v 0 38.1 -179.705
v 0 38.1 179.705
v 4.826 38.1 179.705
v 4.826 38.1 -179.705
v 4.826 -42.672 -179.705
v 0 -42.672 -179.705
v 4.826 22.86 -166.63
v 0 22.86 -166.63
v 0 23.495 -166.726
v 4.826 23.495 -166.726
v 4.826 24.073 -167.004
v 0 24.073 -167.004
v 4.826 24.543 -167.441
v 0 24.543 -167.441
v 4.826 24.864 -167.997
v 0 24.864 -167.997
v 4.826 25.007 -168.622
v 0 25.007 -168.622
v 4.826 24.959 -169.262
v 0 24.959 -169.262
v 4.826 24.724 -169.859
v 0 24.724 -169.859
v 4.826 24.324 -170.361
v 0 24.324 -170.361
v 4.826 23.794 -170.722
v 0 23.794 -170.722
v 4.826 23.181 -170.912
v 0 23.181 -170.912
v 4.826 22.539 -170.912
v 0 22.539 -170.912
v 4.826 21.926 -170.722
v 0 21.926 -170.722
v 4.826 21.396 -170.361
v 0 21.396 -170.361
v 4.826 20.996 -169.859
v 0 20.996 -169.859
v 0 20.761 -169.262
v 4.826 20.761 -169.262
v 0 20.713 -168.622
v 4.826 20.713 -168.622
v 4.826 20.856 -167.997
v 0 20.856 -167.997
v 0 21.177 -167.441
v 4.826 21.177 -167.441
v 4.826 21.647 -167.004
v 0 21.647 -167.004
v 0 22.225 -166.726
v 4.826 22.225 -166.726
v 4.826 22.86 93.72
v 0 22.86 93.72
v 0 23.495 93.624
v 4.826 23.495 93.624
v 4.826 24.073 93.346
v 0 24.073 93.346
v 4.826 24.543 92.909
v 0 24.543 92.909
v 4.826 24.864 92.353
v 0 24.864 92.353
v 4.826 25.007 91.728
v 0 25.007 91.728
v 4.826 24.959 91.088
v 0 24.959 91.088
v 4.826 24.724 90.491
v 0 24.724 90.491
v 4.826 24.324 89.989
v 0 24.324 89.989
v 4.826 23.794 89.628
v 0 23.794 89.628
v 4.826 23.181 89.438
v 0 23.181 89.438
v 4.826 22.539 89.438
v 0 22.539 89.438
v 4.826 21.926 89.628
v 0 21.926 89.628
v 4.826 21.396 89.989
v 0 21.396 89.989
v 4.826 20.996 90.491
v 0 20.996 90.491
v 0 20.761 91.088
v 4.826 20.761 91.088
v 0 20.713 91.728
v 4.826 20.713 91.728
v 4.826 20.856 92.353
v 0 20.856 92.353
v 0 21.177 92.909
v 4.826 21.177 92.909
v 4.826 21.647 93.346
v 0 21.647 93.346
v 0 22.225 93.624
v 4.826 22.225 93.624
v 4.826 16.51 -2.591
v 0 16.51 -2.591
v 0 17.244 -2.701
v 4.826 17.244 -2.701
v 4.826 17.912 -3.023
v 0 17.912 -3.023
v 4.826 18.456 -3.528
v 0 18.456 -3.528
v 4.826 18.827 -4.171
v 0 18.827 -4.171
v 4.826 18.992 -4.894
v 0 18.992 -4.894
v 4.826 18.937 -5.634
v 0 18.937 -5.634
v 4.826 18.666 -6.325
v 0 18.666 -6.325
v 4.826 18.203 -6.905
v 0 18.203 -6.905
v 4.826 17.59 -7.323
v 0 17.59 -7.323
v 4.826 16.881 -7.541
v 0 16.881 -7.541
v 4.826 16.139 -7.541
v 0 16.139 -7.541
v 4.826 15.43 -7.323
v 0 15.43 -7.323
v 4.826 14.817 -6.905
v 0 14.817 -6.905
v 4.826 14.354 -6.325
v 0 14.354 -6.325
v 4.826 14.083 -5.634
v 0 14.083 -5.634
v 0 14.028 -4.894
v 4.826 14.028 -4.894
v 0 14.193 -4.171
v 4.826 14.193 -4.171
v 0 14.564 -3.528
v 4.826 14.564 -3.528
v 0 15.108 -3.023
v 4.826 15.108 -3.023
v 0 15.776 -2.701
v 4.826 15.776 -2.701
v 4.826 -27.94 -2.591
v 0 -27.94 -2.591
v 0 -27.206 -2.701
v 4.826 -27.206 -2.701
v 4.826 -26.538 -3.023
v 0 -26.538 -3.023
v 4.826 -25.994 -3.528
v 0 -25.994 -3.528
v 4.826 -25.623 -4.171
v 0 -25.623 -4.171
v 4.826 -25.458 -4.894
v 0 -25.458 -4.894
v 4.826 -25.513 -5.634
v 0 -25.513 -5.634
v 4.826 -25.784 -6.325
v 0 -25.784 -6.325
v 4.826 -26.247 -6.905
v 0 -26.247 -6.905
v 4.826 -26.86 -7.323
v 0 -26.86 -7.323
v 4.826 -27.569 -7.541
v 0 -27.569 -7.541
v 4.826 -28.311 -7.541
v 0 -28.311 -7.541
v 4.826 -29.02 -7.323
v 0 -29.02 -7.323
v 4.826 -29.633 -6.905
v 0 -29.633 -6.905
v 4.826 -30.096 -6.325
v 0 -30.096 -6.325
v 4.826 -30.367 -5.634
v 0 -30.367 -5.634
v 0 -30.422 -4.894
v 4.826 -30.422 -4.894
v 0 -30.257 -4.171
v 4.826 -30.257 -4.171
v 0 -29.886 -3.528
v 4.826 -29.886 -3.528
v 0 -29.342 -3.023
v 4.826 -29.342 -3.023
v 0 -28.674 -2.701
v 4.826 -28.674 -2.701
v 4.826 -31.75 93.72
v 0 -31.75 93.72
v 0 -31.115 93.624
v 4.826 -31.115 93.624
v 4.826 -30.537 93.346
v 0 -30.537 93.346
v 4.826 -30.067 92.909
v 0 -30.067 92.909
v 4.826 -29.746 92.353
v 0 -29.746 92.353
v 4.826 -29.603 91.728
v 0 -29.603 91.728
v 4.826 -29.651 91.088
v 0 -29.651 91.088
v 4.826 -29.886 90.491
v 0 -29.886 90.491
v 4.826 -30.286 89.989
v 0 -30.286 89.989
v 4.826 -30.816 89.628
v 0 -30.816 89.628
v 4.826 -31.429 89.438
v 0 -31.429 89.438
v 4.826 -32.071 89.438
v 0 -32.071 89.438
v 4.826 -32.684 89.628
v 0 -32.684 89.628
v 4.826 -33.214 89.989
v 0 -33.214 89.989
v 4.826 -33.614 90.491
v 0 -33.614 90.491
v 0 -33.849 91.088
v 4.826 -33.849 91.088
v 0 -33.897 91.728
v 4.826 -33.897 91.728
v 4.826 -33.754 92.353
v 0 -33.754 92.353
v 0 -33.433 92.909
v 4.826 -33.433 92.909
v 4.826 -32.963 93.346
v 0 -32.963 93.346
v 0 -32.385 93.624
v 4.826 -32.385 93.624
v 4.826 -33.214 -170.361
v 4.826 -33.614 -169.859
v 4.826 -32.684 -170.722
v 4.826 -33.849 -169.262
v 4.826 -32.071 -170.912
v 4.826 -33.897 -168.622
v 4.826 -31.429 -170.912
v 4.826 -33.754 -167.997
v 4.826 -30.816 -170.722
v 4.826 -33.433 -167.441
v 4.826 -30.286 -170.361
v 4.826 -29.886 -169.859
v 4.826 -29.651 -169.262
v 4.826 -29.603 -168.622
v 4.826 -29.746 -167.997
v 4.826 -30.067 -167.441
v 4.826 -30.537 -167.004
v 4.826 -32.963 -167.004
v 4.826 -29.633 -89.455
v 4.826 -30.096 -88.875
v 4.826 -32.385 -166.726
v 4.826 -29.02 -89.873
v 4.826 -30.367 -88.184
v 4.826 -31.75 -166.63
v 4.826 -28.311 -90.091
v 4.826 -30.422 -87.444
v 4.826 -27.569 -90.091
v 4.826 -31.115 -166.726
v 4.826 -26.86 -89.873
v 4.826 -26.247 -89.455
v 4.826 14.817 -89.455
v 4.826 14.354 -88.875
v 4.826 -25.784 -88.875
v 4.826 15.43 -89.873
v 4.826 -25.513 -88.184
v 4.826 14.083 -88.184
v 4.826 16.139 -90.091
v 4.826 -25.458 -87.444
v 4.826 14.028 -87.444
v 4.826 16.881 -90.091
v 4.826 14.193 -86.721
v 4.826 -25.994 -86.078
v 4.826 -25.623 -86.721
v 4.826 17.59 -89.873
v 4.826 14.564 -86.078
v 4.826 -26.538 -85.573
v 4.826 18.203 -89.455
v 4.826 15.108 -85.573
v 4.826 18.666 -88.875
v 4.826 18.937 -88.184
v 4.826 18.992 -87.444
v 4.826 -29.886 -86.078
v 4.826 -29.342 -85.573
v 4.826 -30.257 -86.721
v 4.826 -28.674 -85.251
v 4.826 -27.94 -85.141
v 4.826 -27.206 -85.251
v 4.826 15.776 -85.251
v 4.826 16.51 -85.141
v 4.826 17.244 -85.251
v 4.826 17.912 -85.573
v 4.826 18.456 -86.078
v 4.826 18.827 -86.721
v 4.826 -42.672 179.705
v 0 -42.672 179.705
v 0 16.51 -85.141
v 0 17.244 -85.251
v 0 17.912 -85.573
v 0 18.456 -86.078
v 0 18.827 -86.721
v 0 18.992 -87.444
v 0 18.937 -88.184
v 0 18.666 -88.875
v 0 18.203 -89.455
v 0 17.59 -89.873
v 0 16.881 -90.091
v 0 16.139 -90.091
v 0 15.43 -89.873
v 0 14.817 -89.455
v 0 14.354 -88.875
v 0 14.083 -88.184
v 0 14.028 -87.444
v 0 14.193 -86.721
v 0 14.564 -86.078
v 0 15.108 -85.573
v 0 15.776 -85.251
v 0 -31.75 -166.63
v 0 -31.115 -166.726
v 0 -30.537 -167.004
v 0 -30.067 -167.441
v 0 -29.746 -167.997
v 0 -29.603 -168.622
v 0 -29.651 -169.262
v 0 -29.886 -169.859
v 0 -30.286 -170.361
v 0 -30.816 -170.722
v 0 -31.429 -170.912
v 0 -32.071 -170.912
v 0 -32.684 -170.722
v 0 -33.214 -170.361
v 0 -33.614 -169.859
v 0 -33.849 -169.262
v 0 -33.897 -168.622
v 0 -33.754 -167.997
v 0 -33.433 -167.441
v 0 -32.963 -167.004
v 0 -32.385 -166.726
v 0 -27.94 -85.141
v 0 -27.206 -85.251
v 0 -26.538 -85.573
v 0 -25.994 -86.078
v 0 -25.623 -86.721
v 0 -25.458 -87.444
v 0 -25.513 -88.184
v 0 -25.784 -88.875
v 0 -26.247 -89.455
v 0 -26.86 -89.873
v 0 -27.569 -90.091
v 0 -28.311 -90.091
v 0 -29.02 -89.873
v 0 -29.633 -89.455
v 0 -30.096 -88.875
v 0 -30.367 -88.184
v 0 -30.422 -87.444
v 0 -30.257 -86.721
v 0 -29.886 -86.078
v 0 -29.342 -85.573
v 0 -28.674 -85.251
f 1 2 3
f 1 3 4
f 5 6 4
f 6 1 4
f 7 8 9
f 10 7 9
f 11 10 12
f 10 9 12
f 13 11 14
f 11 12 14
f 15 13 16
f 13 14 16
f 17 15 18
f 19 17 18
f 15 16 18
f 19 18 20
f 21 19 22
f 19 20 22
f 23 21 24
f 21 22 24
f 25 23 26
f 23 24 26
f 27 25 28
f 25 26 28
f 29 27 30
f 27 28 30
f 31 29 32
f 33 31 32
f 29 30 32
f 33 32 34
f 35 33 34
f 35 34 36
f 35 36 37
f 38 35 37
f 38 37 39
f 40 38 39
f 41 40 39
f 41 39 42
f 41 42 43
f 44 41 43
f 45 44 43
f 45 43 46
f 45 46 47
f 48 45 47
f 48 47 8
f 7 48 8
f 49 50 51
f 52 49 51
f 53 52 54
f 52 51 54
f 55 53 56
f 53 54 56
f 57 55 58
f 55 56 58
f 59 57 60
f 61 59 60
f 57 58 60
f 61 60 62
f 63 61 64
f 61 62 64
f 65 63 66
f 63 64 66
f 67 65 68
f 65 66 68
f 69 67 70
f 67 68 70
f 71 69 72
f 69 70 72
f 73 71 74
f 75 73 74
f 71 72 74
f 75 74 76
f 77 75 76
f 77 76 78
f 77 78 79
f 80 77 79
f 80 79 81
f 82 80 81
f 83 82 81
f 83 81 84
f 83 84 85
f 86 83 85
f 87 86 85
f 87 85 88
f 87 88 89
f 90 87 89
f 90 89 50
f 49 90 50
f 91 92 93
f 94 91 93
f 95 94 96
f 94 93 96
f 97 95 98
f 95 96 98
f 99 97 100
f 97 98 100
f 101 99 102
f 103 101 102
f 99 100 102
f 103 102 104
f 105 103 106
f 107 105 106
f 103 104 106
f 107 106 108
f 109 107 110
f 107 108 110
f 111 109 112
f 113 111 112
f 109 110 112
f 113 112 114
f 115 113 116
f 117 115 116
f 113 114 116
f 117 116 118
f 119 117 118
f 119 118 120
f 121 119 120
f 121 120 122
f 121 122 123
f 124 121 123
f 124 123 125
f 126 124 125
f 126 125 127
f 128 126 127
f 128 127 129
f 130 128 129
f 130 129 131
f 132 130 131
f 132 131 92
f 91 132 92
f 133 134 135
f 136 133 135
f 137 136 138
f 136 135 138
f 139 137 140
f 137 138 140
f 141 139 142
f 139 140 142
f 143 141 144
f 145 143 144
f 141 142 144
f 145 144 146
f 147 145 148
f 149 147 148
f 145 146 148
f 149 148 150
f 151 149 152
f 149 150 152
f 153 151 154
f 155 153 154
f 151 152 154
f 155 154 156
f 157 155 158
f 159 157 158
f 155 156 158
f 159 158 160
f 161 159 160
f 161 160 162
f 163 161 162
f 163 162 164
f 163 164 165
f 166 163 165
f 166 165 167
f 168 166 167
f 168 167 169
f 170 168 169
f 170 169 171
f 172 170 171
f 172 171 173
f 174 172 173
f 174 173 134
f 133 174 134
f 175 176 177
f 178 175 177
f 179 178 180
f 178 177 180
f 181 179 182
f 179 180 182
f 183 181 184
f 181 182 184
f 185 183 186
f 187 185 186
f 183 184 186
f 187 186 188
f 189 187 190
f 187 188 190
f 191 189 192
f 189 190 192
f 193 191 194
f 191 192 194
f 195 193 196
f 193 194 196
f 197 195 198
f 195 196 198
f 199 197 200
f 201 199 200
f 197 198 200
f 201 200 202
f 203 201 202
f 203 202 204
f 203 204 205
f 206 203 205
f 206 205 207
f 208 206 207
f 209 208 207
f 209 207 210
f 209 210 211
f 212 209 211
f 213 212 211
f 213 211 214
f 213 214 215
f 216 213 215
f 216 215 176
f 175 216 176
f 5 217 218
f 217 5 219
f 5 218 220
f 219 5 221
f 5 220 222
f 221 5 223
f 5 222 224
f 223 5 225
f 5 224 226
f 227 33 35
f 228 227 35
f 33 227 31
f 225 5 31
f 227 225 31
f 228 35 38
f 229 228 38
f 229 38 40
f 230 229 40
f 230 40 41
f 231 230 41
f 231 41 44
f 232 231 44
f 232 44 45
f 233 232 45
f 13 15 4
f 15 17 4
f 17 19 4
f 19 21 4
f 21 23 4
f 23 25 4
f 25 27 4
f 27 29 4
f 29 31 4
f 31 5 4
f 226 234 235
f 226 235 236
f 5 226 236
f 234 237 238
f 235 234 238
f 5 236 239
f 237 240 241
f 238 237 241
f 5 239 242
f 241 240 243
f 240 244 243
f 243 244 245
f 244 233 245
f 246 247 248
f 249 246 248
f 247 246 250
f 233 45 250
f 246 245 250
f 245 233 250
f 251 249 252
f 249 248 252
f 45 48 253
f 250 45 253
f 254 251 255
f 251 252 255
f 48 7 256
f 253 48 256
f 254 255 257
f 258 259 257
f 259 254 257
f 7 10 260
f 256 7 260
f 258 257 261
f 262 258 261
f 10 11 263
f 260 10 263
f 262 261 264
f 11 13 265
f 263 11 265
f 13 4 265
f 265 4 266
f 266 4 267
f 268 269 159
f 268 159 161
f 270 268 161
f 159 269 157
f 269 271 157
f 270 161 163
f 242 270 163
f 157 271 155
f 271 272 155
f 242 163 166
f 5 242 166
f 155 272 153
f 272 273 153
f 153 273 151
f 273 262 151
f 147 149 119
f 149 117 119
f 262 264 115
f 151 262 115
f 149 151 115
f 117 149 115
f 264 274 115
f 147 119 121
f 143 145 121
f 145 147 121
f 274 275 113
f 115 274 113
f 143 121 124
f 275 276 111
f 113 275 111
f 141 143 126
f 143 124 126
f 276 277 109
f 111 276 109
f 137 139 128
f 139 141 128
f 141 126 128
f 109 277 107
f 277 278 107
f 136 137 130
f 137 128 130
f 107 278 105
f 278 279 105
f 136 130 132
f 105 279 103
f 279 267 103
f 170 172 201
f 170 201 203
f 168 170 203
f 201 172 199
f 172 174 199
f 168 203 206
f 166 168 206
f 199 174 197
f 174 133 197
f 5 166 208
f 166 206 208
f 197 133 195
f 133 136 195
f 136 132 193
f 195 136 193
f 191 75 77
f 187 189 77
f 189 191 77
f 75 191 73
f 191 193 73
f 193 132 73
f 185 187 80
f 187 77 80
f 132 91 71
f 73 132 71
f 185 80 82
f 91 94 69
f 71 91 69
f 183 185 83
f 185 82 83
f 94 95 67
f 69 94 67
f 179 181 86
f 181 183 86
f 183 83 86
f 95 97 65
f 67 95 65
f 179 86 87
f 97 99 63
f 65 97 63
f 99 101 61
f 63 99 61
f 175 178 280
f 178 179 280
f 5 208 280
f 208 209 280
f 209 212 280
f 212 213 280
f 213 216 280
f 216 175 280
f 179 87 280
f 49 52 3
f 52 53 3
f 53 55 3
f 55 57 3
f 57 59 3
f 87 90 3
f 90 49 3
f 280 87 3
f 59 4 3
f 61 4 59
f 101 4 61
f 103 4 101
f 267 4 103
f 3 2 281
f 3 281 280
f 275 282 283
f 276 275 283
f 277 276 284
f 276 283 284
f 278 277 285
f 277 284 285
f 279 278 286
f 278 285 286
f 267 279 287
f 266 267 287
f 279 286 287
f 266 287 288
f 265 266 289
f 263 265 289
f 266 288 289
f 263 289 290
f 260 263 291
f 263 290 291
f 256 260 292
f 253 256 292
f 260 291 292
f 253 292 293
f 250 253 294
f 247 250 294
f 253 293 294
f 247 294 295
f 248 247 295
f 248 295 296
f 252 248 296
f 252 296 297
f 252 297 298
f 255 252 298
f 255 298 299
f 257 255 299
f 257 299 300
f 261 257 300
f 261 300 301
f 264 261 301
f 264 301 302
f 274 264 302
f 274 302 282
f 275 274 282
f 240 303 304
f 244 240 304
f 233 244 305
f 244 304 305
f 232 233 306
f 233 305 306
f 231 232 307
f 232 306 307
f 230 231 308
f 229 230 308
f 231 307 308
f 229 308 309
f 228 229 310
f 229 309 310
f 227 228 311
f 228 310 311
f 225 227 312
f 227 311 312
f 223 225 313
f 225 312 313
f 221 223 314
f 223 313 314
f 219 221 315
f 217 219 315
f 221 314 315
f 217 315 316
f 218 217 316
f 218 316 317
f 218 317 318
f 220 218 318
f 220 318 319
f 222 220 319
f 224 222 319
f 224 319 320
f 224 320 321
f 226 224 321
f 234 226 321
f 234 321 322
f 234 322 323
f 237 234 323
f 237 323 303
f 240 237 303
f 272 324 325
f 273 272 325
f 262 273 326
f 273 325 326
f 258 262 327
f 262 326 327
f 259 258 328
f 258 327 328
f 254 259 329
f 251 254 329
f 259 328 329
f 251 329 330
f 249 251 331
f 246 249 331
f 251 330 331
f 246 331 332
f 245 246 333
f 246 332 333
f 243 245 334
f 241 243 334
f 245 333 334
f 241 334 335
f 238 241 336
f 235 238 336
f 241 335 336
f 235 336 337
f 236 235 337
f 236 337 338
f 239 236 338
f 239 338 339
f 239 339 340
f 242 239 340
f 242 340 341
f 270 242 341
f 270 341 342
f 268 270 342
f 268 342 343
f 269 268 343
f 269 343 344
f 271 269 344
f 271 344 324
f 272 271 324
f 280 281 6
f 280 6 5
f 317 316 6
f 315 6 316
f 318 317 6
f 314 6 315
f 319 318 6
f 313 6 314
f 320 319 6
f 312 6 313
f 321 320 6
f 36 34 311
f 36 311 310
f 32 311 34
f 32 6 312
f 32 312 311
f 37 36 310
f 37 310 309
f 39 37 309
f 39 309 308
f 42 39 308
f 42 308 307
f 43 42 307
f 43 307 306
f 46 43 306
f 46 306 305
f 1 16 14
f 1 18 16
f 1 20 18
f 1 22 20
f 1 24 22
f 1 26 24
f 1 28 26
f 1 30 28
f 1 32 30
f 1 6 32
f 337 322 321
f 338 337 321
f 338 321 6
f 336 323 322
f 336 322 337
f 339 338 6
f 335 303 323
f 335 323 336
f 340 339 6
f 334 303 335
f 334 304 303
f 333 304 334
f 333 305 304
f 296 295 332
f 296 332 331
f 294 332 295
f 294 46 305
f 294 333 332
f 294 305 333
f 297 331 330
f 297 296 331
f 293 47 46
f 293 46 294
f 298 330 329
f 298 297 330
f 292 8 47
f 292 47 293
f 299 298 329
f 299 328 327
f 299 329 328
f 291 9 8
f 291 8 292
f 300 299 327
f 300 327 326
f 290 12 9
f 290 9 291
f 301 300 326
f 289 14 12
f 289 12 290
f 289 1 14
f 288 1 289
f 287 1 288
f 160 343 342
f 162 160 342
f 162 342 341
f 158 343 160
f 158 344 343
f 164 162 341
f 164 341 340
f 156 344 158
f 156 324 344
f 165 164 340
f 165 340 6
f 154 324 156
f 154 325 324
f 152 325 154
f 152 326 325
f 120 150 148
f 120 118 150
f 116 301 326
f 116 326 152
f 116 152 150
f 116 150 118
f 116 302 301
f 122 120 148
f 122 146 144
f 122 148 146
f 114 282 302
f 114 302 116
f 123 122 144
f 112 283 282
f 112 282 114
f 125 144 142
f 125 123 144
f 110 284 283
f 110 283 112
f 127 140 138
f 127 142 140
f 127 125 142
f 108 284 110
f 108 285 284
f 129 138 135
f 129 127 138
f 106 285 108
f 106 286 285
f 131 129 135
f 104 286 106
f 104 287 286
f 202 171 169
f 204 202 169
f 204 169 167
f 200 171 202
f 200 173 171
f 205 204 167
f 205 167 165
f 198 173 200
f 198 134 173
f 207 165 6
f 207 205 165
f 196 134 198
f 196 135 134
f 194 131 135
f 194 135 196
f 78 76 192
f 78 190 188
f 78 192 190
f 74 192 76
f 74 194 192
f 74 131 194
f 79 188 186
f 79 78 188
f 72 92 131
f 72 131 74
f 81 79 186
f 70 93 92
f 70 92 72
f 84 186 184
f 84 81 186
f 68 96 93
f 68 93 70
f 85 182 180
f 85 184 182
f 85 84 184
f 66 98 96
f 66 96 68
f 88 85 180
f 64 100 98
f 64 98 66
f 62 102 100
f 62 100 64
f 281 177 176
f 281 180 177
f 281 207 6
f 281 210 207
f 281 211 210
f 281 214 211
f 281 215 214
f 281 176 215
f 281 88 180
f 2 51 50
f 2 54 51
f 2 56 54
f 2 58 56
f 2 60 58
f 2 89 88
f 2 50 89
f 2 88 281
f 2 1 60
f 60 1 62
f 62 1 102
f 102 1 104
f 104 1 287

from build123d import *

# Parameters (mm, degrees)
SKETCH1_W                 = 359.41
SKETCH1_H                 = 76.2
BOSS_EXTRUDE1_DEPTH       = 4.826
F_10_CLEARANCE_HOLE1_D    = 4.9784
F_8_CLEARANCE_HOLE1_D     = 4.3053
F_8_CLEARANCE_HOLE1_DEPTH = 12.7
F_8_CLEARANCE_HOLE1_TIP   = 1.293442612
SKETCH31_W                = 4.826
SKETCH31_H                = 359.41
BOSS_EXTRUDE10_DEPTH      = 4.572


with BuildPart() as part:
    # Sketch1 → Boss-Extrude1 (new body)
    with BuildSketch(Plane(origin=(0, 0, 0), x_dir=(0, 0, -1), z_dir=(1, 0, 0))):
        Rectangle(SKETCH1_W, SKETCH1_H)
    extrude(amount=BOSS_EXTRUDE1_DEPTH)

    # #10 Clearance Hole1 (through all)
    with Locations(Plane(origin=(4.826, 0, 0), x_dir=(0, 0, -1), z_dir=(1, 0, 0))):
        with Locations((87.63, -27.94), (5.08, -27.94), (5.08, 16.51), (87.63, 16.51)):
            Hole(F_10_CLEARANCE_HOLE1_D / 2)

    # #8 Clearance Hole1
    with Locations(Plane(origin=(4.826, 0, 0), x_dir=(0, 0, -1), z_dir=(1, 0, 0))):
        with Locations((-91.567, 22.86), (-91.567, -31.75), (168.783, -31.75), (168.783, 22.86)):
            Hole(F_8_CLEARANCE_HOLE1_D / 2, depth=F_8_CLEARANCE_HOLE1_DEPTH)
            with Locations((0, 0, -(F_8_CLEARANCE_HOLE1_DEPTH + F_8_CLEARANCE_HOLE1_TIP / 2))):  # 118° drill point
                Cone(0, F_8_CLEARANCE_HOLE1_D / 2, F_8_CLEARANCE_HOLE1_TIP, mode=Mode.SUBTRACT)

    # Sketch31 → Boss-Extrude10 (add)
    with BuildSketch(Plane.XZ.offset(38.1)):
        with Locations((2.413, 0)):
            Rectangle(SKETCH31_W, SKETCH31_H)
    extrude(amount=BOSS_EXTRUDE10_DEPTH)


solid = part.part
